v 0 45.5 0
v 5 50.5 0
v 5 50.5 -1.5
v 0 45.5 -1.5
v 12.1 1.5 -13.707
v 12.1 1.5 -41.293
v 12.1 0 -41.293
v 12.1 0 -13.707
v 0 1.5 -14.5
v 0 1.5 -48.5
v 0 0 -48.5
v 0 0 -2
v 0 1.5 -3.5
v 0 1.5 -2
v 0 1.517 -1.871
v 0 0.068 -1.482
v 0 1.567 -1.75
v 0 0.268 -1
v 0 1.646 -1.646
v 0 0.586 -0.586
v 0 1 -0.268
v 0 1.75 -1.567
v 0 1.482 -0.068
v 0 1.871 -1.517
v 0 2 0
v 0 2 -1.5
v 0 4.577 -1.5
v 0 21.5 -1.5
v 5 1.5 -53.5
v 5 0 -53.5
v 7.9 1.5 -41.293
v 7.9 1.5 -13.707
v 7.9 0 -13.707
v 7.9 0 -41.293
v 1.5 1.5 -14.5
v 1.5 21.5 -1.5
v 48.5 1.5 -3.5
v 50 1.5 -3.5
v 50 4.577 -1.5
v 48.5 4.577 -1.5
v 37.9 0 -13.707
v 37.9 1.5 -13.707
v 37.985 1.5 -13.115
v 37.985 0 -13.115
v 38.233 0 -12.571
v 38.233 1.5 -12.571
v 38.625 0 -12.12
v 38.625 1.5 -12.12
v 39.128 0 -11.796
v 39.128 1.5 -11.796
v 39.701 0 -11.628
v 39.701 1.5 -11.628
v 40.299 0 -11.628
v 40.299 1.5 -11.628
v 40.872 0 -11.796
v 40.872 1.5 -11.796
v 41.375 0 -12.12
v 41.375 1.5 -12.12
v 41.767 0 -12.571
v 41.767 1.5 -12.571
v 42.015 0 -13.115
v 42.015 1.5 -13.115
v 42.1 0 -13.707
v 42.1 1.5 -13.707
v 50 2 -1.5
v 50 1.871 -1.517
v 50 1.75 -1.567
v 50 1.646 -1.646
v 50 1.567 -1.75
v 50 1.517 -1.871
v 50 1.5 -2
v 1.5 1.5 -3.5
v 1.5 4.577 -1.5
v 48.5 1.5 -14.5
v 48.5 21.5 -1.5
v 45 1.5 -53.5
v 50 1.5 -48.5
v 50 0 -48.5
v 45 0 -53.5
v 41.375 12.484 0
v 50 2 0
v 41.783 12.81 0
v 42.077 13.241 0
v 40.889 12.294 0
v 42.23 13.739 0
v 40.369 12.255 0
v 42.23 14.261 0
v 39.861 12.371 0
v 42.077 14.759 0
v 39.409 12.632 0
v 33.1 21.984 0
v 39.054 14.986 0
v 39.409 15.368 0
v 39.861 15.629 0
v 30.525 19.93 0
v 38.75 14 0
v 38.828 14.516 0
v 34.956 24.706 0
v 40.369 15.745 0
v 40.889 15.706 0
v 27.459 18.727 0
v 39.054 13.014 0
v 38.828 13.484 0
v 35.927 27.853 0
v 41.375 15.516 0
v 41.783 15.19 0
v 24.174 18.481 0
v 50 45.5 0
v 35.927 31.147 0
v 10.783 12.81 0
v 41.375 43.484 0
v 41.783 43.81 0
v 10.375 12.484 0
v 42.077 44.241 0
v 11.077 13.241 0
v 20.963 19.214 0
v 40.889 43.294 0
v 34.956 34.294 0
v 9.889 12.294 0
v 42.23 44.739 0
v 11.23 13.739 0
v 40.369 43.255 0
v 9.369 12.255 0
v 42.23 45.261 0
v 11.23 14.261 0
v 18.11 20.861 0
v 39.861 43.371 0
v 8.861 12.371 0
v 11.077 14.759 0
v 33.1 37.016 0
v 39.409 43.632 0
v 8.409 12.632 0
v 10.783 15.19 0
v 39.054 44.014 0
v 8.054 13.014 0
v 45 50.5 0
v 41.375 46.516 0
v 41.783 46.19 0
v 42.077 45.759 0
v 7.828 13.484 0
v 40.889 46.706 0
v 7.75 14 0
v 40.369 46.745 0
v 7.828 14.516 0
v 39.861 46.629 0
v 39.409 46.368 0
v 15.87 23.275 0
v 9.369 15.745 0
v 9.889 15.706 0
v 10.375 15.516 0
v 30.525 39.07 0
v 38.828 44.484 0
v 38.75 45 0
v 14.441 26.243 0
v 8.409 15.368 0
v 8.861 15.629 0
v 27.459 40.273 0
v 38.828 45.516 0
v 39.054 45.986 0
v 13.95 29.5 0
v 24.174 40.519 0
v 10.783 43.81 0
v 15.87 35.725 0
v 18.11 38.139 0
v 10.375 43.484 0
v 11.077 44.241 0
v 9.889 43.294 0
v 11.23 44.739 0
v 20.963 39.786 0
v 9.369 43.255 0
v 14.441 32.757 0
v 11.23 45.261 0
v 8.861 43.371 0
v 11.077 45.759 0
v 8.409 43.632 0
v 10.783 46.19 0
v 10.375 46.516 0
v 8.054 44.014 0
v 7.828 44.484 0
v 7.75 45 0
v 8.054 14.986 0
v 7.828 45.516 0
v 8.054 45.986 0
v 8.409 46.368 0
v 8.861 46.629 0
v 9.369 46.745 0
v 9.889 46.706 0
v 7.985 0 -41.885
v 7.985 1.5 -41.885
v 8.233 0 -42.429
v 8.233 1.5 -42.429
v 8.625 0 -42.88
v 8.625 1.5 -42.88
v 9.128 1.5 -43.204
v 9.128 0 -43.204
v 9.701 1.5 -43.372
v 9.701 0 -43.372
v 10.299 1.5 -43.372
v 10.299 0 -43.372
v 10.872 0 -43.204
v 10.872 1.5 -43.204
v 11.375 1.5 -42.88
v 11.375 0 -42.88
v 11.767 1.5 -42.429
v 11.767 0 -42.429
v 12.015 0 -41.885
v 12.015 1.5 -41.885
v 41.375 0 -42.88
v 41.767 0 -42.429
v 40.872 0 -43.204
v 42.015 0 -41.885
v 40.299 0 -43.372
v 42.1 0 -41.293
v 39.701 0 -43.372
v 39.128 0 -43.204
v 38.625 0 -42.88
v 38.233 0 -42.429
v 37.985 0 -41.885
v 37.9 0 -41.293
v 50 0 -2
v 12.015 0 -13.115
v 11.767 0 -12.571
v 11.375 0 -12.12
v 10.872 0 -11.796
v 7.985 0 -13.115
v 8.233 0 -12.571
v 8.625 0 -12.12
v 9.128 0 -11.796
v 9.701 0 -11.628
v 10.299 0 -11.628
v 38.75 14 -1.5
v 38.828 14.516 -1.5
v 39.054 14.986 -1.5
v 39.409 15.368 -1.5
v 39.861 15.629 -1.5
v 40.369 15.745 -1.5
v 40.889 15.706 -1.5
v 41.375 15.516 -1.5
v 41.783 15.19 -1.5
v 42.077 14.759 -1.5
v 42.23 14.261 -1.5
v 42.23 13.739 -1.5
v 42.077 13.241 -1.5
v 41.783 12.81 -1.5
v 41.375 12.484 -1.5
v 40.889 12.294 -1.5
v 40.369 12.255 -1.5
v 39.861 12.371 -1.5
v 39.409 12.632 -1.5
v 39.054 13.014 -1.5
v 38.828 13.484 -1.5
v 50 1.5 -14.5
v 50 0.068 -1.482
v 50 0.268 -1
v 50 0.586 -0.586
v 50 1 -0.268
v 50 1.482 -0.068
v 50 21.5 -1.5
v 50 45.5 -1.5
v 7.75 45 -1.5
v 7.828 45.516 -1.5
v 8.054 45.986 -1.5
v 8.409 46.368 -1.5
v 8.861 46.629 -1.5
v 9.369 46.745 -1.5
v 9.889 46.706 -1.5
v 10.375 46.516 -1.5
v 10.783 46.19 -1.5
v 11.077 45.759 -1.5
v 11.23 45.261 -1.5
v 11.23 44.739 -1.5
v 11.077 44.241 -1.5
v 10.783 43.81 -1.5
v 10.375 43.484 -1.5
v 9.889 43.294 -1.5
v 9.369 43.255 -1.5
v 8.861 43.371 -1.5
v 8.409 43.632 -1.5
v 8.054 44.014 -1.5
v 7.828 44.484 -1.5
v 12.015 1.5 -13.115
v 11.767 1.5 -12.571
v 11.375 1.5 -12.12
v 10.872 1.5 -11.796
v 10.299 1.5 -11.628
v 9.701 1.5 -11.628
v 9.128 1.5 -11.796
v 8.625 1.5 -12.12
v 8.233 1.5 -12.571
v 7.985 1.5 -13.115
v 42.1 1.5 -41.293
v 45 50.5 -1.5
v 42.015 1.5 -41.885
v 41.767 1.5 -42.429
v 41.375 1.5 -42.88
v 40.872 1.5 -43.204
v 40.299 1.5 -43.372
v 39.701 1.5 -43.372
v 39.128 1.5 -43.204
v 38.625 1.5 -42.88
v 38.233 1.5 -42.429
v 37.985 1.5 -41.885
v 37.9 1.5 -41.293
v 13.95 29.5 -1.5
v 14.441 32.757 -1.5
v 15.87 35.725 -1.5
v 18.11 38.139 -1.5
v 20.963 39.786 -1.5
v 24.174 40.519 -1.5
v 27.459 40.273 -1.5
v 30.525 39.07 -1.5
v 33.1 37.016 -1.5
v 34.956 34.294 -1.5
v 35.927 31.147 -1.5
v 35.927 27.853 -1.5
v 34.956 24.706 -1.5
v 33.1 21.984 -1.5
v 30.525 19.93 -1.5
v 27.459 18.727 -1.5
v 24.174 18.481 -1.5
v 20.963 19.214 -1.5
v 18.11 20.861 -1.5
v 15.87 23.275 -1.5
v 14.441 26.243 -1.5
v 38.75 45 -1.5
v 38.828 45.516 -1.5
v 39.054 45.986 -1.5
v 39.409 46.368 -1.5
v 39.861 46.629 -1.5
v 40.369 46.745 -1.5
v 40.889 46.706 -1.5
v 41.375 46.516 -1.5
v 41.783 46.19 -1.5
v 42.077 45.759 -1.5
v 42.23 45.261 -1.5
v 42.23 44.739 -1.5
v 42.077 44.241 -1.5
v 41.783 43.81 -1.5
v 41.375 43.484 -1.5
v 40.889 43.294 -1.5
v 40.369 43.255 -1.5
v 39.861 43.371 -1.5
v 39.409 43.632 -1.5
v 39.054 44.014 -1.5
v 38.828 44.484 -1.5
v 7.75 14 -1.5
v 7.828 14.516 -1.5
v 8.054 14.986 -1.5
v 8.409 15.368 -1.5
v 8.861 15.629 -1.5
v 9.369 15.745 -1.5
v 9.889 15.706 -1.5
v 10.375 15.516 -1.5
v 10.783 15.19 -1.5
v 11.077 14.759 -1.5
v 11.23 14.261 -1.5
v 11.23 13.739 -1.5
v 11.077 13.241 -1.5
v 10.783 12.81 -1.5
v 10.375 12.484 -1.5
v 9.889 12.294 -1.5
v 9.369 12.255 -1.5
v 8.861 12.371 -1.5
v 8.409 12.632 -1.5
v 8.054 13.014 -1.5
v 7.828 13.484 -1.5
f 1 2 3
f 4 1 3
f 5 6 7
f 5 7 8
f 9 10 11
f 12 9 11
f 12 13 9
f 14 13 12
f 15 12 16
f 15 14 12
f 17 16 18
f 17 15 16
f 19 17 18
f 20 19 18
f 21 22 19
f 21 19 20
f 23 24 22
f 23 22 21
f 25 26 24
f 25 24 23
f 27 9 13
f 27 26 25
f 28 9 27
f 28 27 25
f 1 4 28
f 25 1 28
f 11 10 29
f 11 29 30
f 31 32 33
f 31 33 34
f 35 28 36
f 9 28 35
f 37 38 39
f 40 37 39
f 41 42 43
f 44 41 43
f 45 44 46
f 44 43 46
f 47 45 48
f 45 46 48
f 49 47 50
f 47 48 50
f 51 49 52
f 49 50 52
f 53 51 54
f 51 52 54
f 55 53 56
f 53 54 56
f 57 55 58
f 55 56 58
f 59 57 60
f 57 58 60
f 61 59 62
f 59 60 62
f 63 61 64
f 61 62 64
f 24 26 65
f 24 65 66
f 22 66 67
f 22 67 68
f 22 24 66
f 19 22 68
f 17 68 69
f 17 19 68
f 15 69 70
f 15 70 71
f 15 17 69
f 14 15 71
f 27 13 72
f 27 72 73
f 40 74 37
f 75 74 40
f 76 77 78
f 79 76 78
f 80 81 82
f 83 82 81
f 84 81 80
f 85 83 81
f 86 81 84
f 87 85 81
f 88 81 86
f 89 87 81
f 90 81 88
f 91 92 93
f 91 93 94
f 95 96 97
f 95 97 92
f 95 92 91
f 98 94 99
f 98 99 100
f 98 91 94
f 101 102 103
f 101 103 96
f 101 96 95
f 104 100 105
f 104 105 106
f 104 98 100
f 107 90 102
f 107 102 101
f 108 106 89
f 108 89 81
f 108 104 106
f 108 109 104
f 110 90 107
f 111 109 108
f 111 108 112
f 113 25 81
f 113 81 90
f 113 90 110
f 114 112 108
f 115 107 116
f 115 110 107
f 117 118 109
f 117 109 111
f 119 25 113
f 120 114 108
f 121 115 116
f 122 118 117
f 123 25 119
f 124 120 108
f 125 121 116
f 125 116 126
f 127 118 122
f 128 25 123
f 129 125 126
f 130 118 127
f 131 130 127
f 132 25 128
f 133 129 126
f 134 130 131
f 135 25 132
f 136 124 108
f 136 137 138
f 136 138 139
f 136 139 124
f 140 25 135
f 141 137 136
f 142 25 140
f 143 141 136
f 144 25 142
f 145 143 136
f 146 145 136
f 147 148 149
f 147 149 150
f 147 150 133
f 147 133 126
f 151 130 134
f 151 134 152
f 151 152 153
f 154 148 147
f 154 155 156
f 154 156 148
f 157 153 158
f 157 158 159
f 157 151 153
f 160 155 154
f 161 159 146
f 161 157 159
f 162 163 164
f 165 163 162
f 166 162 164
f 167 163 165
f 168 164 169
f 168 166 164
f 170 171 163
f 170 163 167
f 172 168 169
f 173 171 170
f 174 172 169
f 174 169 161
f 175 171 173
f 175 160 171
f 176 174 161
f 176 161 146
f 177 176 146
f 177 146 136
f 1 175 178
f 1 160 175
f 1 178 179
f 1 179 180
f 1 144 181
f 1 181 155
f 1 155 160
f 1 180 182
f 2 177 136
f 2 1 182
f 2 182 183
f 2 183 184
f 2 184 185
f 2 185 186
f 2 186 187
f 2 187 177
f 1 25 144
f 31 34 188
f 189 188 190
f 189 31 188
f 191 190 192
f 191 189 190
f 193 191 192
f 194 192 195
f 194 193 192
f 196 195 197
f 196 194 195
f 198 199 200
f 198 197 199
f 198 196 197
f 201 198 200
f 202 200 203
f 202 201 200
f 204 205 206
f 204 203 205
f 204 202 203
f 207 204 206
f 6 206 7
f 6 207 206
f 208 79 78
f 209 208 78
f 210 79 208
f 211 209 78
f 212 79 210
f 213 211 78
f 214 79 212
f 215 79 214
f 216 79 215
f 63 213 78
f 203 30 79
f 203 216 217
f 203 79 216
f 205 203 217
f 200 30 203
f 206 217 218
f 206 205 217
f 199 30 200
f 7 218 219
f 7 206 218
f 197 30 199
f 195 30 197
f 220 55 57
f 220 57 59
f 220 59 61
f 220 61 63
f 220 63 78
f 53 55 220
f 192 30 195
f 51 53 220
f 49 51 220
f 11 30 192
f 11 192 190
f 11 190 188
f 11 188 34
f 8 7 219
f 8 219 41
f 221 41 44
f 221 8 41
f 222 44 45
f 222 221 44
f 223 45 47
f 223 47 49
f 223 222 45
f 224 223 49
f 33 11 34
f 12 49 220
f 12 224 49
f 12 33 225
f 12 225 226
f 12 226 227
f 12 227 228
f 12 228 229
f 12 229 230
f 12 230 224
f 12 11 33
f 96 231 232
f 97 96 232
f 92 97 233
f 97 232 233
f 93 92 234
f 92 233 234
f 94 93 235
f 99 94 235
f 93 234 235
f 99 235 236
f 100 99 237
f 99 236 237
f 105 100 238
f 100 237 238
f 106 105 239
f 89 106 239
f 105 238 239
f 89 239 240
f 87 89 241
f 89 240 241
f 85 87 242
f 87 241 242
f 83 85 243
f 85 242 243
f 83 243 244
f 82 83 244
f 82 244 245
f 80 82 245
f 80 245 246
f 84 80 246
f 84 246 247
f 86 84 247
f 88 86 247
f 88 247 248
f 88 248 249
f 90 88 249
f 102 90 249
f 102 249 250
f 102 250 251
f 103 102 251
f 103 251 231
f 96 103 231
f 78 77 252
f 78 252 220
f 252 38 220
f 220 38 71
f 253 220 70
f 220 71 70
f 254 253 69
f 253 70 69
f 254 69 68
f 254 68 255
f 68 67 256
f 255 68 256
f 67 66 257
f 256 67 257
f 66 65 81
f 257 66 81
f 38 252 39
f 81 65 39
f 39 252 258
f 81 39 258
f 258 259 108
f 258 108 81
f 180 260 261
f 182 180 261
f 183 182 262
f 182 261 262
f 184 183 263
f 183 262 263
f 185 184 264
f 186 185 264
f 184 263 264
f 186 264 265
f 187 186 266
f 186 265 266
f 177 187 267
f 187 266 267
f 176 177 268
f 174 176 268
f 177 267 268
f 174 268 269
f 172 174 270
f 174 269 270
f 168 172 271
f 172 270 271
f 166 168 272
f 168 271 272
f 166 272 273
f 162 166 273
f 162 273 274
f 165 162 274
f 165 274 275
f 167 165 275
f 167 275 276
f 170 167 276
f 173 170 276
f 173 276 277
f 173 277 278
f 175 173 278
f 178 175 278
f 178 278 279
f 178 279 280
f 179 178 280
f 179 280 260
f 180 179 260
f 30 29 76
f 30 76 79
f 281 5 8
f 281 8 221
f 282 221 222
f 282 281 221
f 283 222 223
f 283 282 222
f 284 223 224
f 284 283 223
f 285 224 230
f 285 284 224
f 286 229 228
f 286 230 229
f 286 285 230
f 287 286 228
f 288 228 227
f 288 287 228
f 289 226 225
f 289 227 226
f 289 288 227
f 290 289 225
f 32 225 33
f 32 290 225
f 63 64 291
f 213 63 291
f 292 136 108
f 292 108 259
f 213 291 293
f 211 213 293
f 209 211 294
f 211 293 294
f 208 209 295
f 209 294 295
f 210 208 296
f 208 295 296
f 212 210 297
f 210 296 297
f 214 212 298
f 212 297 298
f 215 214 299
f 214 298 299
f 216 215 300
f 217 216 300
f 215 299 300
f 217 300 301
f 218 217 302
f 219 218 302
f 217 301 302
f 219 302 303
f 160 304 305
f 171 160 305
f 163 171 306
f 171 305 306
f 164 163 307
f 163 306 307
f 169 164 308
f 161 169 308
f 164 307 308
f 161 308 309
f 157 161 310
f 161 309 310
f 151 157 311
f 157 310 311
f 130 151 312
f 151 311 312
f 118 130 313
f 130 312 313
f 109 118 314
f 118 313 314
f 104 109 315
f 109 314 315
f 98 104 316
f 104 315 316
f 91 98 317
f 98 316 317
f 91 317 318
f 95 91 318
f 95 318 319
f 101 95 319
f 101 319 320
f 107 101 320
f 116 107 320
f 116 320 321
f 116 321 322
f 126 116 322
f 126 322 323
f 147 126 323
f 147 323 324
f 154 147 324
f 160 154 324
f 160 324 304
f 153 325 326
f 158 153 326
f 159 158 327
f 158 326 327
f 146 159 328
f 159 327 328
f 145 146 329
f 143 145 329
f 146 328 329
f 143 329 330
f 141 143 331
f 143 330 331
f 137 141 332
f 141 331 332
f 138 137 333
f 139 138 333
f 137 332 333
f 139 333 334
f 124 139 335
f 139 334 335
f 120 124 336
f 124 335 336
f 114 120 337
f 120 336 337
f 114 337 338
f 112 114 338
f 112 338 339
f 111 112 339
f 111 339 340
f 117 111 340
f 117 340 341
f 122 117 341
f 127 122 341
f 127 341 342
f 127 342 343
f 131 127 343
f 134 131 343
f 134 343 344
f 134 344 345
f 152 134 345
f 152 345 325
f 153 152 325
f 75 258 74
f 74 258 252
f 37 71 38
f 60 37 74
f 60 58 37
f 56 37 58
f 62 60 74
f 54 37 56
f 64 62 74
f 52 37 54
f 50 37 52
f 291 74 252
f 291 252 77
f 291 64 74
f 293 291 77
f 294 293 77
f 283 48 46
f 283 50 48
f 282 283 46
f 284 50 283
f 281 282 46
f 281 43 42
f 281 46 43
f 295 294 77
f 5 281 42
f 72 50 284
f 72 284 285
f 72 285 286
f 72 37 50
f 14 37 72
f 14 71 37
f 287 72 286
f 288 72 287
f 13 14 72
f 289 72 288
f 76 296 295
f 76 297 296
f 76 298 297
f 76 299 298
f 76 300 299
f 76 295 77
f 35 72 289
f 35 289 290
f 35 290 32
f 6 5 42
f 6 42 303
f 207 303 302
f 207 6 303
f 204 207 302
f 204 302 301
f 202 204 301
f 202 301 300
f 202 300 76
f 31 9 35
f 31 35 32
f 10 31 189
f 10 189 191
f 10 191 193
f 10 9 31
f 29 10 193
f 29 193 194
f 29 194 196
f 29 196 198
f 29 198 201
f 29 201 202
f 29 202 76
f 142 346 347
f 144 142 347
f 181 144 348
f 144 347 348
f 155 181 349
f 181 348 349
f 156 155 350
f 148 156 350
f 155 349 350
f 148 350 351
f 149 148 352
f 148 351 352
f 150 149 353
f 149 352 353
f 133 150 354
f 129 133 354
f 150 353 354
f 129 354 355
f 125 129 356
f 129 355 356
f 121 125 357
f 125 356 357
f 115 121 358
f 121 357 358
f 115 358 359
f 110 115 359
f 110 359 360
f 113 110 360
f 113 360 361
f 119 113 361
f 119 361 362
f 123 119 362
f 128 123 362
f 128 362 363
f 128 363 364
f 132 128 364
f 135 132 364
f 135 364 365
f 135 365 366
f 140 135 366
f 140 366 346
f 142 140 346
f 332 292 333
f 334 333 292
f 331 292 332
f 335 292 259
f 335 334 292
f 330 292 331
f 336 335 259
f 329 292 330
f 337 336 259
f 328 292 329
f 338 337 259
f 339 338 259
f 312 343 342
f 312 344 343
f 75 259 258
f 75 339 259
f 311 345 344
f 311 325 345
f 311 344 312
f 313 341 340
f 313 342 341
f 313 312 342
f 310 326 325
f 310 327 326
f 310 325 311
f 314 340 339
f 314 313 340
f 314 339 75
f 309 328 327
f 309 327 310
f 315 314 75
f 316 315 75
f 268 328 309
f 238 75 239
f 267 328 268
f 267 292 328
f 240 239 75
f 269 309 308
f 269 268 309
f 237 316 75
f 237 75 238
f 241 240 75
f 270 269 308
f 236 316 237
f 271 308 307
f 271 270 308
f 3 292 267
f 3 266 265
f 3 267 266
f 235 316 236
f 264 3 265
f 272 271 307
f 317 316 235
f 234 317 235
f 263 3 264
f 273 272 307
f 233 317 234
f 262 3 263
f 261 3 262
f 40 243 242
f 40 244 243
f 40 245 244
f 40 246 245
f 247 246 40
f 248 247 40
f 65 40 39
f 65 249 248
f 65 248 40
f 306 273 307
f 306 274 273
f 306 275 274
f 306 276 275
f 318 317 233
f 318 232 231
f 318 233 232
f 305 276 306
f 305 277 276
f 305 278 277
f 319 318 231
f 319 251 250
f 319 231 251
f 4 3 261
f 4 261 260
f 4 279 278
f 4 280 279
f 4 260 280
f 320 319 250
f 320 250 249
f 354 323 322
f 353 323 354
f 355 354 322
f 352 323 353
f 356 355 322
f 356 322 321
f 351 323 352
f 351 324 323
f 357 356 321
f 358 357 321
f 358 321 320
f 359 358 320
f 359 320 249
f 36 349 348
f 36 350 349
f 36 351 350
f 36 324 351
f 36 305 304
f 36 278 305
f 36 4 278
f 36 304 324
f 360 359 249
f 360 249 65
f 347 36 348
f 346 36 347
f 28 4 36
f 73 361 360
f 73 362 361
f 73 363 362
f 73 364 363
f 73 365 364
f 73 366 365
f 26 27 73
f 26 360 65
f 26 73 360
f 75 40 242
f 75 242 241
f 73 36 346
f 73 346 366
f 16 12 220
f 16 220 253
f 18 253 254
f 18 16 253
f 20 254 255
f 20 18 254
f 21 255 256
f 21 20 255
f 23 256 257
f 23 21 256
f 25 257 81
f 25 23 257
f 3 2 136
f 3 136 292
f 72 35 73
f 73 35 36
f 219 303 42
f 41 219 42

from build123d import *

# Parameters (mm, degrees)
LINEAR_AUSTRAGEN_D_NN1_DEPTH    = 50
SKIZZE2_R                       = 11.05
SKIZZE2_R_2                     = 1.75
SCHNITT_LINEAR_AUSTRAGEN1_DEPTH = 2.5
AUFSATZ_LINEAR_AUSTRAGEN1_DEPTH = 1.5
SCHNITT_LINEAR_AUSTRAGEN2_DEPTH = 2.5
FASE1_SIZE                      = 5


with BuildPart() as part:
    # Skizze1 → Linear-Austragen-Dünn1 (new body)
    with BuildSketch(Plane(origin=(0, 0, 0), x_dir=(0, 0, -1), z_dir=(1, 0, 0))):
        with BuildLine():
            Line((53.5, 0), (2, 0))
            ThreePointArc((2, 0), (0.585786438, 0.585786438), (0, 2))
            Line((0, 2), (0, 50.5))
            Line((0, 50.5), (1.5, 50.5))
            Line((1.5, 50.5), (1.5, 2))
            ThreePointArc((1.5, 2), (1.646446609, 1.646446609), (2, 1.5))
            Line((2, 1.5), (53.5, 1.5))
            Line((53.5, 1.5), (53.5, 0))
        make_face()
    extrude(amount=LINEAR_AUSTRAGEN_D_NN1_DEPTH)

    # Skizze2 → Schnitt-Linear austragen1 (cut, through all)
    with BuildSketch(Plane(origin=(0, 0, -1.5), x_dir=(-1, 0, 0), z_dir=(0, 0, -1))):
        with Locations((-25, 29.5)):
            Circle(SKIZZE2_R)
        with Locations((-40.5, 45)):
            Circle(SKIZZE2_R_2)
        with Locations((-9.5, 45)):
            Circle(SKIZZE2_R_2)
        with Locations((-9.5, 14)):
            Circle(SKIZZE2_R_2)
        with Locations((-40.5, 14)):
            Circle(SKIZZE2_R_2)
    extrude(amount=-SCHNITT_LINEAR_AUSTRAGEN1_DEPTH, mode=Mode.SUBTRACT)

    # Skizze3 → Aufsatz-Linear austragen1 (add)
    with BuildSketch(Plane(origin=(50, 0, 0), x_dir=(0, 0, -1), z_dir=(1, 0, 0))):
        Polygon((1.5, 21.5), (14.5, 1.5), (3.5, 1.5), (1.5, 4.576923077), align=None)
    aufsatz_linear_austragen1 = extrude(amount=-AUFSATZ_LINEAR_AUSTRAGEN1_DEPTH)

    # Spiegeln1: Aufsatz-Linear austragen1 across plane
    add(aufsatz_linear_austragen1.mirror(Plane(origin=(25, 0, 0), x_dir=(0, 0, 1), z_dir=(1, 0, 0))))

    # Skizze4 → Schnitt-Linear austragen2 (cut, through all)
    with BuildSketch(Plane(origin=(0, 1.5, 0), x_dir=(1, 0, 0), z_dir=(0, 1, 0))):
        with BuildLine():
            Line((7.9, 13.706666488), (7.9, 41.293333512))
            ThreePointArc((7.9, 41.293333512), (10, 43.393333512), (12.1, 41.293333512))
            Line((12.1, 41.293333512), (12.1, 13.706666488))
            ThreePointArc((12.1, 13.706666488), (10, 11.606666488), (7.9, 13.706666488))
        make_face()
        with BuildLine():
            Line((42.1, 13.706666488), (42.1, 41.293333512))
            ThreePointArc((42.1, 41.293333512), (40, 43.393333512), (37.9, 41.293333512))
            Line((37.9, 41.293333512), (37.9, 13.706666488))
            ThreePointArc((37.9, 13.706666488), (40, 11.606666488), (42.1, 13.706666488))
        make_face()
    extrude(amount=-SCHNITT_LINEAR_AUSTRAGEN2_DEPTH, mode=Mode.SUBTRACT)

    # Fase1
    fase1_edges = [part.edges().sort_by_distance(p)[0] for p in [
        (50, 50.5, -0.75),
        (50, 0.75, -53.5),
        (0, 50.5, -0.75),
        (0, 0.75, -53.5),
    ]]
    chamfer(fase1_edges, length=FASE1_SIZE)


solid = part.part
